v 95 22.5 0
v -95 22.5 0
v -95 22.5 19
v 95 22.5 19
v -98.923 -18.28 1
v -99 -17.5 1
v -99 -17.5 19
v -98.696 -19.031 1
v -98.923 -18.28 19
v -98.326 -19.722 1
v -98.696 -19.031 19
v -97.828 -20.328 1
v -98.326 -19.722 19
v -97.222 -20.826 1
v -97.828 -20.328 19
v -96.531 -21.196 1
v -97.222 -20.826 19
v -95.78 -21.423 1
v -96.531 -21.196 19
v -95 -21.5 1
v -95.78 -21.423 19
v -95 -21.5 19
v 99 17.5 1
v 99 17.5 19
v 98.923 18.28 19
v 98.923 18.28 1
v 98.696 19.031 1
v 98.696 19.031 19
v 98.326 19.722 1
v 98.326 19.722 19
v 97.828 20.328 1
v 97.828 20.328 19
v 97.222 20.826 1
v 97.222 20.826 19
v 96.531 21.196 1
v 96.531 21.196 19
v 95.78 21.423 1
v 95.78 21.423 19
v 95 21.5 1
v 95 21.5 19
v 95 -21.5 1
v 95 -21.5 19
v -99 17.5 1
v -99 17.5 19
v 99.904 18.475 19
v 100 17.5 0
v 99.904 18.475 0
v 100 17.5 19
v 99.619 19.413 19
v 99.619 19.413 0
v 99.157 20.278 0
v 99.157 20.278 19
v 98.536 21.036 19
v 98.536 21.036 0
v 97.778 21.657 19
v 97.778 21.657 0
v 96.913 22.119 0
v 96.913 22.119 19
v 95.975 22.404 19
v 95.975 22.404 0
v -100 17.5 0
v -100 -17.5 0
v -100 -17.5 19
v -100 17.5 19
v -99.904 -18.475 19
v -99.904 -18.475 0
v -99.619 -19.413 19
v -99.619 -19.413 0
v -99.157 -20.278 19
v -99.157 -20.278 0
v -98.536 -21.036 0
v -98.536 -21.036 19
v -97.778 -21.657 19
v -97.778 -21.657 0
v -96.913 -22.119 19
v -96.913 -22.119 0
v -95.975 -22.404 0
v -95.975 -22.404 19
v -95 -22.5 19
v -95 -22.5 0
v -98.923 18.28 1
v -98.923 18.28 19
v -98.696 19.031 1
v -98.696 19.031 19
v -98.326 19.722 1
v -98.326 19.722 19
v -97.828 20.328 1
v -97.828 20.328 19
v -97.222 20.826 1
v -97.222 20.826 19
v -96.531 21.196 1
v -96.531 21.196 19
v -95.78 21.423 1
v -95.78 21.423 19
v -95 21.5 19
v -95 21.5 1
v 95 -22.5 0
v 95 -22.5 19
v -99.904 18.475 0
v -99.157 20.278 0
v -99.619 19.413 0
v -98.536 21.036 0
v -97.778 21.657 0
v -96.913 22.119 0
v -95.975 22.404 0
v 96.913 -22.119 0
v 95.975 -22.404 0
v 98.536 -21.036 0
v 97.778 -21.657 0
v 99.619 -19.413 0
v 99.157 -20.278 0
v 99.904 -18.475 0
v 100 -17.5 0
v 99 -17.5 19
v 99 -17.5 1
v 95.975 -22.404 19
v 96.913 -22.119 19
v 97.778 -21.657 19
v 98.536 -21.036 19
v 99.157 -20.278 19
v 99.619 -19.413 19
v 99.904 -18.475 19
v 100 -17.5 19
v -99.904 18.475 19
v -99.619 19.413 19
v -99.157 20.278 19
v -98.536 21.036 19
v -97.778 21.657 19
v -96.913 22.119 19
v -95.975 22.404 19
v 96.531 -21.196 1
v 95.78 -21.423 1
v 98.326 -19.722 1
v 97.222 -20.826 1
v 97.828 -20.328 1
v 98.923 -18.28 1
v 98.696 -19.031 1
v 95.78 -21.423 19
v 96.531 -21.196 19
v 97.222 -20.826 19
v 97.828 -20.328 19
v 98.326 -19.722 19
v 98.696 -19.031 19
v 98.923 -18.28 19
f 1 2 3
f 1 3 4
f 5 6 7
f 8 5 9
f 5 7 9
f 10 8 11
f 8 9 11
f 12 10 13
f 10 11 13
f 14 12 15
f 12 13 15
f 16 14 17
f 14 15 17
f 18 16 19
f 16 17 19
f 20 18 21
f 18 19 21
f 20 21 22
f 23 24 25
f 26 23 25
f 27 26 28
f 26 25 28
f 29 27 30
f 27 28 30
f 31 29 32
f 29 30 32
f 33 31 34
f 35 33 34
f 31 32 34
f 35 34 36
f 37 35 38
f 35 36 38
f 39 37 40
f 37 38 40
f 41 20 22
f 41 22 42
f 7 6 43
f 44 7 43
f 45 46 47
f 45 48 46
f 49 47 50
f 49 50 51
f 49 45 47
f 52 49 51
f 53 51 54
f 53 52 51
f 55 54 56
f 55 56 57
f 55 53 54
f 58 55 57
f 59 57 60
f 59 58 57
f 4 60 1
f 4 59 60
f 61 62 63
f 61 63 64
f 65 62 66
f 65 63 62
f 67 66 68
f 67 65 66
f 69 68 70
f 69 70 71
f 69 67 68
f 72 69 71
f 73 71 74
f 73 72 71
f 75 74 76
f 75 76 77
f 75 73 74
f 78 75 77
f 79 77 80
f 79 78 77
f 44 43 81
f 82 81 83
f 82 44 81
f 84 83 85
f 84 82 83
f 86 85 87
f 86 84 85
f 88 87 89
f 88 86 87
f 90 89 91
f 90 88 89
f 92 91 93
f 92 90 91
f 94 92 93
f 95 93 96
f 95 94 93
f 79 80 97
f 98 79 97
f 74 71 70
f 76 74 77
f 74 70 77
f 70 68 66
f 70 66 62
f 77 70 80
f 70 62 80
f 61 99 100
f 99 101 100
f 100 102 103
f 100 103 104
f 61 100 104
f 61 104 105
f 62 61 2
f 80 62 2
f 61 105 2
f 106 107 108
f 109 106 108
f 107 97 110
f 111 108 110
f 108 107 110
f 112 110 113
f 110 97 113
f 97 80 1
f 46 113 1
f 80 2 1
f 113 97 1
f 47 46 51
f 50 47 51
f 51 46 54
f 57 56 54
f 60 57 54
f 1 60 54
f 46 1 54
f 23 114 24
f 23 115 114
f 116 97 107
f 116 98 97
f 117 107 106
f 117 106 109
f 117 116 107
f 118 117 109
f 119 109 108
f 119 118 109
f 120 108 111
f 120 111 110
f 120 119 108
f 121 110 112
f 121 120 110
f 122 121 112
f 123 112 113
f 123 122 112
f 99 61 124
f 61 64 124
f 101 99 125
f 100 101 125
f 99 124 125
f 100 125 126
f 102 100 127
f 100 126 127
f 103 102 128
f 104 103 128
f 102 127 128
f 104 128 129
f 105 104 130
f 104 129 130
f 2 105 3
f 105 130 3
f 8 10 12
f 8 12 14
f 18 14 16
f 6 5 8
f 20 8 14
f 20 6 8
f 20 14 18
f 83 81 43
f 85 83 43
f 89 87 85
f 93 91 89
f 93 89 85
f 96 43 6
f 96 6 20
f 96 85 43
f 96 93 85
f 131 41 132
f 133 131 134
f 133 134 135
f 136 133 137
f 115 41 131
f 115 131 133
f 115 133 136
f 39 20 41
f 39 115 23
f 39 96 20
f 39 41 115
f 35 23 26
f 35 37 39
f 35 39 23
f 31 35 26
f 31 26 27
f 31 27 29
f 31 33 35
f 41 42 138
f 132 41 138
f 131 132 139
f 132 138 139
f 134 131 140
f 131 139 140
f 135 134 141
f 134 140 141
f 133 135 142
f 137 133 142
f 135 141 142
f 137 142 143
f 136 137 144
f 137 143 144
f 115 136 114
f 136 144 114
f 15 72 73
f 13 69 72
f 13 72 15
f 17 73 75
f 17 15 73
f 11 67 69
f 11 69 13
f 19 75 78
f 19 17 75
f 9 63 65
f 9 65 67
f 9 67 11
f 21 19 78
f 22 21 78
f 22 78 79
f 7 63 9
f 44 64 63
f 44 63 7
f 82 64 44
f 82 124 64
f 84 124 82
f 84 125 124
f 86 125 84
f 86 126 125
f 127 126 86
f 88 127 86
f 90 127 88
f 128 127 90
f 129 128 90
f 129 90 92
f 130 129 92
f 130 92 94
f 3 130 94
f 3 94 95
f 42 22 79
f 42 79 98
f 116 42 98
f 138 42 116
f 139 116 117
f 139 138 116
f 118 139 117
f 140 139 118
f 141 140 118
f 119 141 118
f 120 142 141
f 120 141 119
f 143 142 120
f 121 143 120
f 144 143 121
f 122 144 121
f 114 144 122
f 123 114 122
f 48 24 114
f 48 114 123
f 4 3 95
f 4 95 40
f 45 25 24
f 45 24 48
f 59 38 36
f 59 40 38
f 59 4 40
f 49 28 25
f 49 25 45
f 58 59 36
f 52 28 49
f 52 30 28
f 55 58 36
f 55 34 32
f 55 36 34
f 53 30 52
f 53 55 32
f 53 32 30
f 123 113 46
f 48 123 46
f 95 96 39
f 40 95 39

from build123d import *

# Parameters (mm, degrees)
SKETCH_W    = 200
SKETCH_H    = 45
PAD_DEPTH   = 19
FILLET_R    = 5
THICKNESS_T = -1


with BuildPart() as part:
    # Sketch → Pad (new body)
    with BuildSketch(Plane.XY):
        Rectangle(SKETCH_W, SKETCH_H)
    extrude(amount=PAD_DEPTH)

    # Fillet
    fillet_edges = [part.edges().sort_by_distance(p)[0] for p in [
        (-100, -22.5, 9.5),
        (-100, 22.5, 9.5),
        (100, -22.5, 9.5),
        (100, 22.5, 9.5),
    ]]
    fillet(fillet_edges, radius=FILLET_R)

    # Thickness
    thickness_openings = [part.faces().sort_by_distance(p)[0] for p in [
        (0, 0, 19),
    ]]
    offset(amount=THICKNESS_T, openings=thickness_openings)


solid = part.part
